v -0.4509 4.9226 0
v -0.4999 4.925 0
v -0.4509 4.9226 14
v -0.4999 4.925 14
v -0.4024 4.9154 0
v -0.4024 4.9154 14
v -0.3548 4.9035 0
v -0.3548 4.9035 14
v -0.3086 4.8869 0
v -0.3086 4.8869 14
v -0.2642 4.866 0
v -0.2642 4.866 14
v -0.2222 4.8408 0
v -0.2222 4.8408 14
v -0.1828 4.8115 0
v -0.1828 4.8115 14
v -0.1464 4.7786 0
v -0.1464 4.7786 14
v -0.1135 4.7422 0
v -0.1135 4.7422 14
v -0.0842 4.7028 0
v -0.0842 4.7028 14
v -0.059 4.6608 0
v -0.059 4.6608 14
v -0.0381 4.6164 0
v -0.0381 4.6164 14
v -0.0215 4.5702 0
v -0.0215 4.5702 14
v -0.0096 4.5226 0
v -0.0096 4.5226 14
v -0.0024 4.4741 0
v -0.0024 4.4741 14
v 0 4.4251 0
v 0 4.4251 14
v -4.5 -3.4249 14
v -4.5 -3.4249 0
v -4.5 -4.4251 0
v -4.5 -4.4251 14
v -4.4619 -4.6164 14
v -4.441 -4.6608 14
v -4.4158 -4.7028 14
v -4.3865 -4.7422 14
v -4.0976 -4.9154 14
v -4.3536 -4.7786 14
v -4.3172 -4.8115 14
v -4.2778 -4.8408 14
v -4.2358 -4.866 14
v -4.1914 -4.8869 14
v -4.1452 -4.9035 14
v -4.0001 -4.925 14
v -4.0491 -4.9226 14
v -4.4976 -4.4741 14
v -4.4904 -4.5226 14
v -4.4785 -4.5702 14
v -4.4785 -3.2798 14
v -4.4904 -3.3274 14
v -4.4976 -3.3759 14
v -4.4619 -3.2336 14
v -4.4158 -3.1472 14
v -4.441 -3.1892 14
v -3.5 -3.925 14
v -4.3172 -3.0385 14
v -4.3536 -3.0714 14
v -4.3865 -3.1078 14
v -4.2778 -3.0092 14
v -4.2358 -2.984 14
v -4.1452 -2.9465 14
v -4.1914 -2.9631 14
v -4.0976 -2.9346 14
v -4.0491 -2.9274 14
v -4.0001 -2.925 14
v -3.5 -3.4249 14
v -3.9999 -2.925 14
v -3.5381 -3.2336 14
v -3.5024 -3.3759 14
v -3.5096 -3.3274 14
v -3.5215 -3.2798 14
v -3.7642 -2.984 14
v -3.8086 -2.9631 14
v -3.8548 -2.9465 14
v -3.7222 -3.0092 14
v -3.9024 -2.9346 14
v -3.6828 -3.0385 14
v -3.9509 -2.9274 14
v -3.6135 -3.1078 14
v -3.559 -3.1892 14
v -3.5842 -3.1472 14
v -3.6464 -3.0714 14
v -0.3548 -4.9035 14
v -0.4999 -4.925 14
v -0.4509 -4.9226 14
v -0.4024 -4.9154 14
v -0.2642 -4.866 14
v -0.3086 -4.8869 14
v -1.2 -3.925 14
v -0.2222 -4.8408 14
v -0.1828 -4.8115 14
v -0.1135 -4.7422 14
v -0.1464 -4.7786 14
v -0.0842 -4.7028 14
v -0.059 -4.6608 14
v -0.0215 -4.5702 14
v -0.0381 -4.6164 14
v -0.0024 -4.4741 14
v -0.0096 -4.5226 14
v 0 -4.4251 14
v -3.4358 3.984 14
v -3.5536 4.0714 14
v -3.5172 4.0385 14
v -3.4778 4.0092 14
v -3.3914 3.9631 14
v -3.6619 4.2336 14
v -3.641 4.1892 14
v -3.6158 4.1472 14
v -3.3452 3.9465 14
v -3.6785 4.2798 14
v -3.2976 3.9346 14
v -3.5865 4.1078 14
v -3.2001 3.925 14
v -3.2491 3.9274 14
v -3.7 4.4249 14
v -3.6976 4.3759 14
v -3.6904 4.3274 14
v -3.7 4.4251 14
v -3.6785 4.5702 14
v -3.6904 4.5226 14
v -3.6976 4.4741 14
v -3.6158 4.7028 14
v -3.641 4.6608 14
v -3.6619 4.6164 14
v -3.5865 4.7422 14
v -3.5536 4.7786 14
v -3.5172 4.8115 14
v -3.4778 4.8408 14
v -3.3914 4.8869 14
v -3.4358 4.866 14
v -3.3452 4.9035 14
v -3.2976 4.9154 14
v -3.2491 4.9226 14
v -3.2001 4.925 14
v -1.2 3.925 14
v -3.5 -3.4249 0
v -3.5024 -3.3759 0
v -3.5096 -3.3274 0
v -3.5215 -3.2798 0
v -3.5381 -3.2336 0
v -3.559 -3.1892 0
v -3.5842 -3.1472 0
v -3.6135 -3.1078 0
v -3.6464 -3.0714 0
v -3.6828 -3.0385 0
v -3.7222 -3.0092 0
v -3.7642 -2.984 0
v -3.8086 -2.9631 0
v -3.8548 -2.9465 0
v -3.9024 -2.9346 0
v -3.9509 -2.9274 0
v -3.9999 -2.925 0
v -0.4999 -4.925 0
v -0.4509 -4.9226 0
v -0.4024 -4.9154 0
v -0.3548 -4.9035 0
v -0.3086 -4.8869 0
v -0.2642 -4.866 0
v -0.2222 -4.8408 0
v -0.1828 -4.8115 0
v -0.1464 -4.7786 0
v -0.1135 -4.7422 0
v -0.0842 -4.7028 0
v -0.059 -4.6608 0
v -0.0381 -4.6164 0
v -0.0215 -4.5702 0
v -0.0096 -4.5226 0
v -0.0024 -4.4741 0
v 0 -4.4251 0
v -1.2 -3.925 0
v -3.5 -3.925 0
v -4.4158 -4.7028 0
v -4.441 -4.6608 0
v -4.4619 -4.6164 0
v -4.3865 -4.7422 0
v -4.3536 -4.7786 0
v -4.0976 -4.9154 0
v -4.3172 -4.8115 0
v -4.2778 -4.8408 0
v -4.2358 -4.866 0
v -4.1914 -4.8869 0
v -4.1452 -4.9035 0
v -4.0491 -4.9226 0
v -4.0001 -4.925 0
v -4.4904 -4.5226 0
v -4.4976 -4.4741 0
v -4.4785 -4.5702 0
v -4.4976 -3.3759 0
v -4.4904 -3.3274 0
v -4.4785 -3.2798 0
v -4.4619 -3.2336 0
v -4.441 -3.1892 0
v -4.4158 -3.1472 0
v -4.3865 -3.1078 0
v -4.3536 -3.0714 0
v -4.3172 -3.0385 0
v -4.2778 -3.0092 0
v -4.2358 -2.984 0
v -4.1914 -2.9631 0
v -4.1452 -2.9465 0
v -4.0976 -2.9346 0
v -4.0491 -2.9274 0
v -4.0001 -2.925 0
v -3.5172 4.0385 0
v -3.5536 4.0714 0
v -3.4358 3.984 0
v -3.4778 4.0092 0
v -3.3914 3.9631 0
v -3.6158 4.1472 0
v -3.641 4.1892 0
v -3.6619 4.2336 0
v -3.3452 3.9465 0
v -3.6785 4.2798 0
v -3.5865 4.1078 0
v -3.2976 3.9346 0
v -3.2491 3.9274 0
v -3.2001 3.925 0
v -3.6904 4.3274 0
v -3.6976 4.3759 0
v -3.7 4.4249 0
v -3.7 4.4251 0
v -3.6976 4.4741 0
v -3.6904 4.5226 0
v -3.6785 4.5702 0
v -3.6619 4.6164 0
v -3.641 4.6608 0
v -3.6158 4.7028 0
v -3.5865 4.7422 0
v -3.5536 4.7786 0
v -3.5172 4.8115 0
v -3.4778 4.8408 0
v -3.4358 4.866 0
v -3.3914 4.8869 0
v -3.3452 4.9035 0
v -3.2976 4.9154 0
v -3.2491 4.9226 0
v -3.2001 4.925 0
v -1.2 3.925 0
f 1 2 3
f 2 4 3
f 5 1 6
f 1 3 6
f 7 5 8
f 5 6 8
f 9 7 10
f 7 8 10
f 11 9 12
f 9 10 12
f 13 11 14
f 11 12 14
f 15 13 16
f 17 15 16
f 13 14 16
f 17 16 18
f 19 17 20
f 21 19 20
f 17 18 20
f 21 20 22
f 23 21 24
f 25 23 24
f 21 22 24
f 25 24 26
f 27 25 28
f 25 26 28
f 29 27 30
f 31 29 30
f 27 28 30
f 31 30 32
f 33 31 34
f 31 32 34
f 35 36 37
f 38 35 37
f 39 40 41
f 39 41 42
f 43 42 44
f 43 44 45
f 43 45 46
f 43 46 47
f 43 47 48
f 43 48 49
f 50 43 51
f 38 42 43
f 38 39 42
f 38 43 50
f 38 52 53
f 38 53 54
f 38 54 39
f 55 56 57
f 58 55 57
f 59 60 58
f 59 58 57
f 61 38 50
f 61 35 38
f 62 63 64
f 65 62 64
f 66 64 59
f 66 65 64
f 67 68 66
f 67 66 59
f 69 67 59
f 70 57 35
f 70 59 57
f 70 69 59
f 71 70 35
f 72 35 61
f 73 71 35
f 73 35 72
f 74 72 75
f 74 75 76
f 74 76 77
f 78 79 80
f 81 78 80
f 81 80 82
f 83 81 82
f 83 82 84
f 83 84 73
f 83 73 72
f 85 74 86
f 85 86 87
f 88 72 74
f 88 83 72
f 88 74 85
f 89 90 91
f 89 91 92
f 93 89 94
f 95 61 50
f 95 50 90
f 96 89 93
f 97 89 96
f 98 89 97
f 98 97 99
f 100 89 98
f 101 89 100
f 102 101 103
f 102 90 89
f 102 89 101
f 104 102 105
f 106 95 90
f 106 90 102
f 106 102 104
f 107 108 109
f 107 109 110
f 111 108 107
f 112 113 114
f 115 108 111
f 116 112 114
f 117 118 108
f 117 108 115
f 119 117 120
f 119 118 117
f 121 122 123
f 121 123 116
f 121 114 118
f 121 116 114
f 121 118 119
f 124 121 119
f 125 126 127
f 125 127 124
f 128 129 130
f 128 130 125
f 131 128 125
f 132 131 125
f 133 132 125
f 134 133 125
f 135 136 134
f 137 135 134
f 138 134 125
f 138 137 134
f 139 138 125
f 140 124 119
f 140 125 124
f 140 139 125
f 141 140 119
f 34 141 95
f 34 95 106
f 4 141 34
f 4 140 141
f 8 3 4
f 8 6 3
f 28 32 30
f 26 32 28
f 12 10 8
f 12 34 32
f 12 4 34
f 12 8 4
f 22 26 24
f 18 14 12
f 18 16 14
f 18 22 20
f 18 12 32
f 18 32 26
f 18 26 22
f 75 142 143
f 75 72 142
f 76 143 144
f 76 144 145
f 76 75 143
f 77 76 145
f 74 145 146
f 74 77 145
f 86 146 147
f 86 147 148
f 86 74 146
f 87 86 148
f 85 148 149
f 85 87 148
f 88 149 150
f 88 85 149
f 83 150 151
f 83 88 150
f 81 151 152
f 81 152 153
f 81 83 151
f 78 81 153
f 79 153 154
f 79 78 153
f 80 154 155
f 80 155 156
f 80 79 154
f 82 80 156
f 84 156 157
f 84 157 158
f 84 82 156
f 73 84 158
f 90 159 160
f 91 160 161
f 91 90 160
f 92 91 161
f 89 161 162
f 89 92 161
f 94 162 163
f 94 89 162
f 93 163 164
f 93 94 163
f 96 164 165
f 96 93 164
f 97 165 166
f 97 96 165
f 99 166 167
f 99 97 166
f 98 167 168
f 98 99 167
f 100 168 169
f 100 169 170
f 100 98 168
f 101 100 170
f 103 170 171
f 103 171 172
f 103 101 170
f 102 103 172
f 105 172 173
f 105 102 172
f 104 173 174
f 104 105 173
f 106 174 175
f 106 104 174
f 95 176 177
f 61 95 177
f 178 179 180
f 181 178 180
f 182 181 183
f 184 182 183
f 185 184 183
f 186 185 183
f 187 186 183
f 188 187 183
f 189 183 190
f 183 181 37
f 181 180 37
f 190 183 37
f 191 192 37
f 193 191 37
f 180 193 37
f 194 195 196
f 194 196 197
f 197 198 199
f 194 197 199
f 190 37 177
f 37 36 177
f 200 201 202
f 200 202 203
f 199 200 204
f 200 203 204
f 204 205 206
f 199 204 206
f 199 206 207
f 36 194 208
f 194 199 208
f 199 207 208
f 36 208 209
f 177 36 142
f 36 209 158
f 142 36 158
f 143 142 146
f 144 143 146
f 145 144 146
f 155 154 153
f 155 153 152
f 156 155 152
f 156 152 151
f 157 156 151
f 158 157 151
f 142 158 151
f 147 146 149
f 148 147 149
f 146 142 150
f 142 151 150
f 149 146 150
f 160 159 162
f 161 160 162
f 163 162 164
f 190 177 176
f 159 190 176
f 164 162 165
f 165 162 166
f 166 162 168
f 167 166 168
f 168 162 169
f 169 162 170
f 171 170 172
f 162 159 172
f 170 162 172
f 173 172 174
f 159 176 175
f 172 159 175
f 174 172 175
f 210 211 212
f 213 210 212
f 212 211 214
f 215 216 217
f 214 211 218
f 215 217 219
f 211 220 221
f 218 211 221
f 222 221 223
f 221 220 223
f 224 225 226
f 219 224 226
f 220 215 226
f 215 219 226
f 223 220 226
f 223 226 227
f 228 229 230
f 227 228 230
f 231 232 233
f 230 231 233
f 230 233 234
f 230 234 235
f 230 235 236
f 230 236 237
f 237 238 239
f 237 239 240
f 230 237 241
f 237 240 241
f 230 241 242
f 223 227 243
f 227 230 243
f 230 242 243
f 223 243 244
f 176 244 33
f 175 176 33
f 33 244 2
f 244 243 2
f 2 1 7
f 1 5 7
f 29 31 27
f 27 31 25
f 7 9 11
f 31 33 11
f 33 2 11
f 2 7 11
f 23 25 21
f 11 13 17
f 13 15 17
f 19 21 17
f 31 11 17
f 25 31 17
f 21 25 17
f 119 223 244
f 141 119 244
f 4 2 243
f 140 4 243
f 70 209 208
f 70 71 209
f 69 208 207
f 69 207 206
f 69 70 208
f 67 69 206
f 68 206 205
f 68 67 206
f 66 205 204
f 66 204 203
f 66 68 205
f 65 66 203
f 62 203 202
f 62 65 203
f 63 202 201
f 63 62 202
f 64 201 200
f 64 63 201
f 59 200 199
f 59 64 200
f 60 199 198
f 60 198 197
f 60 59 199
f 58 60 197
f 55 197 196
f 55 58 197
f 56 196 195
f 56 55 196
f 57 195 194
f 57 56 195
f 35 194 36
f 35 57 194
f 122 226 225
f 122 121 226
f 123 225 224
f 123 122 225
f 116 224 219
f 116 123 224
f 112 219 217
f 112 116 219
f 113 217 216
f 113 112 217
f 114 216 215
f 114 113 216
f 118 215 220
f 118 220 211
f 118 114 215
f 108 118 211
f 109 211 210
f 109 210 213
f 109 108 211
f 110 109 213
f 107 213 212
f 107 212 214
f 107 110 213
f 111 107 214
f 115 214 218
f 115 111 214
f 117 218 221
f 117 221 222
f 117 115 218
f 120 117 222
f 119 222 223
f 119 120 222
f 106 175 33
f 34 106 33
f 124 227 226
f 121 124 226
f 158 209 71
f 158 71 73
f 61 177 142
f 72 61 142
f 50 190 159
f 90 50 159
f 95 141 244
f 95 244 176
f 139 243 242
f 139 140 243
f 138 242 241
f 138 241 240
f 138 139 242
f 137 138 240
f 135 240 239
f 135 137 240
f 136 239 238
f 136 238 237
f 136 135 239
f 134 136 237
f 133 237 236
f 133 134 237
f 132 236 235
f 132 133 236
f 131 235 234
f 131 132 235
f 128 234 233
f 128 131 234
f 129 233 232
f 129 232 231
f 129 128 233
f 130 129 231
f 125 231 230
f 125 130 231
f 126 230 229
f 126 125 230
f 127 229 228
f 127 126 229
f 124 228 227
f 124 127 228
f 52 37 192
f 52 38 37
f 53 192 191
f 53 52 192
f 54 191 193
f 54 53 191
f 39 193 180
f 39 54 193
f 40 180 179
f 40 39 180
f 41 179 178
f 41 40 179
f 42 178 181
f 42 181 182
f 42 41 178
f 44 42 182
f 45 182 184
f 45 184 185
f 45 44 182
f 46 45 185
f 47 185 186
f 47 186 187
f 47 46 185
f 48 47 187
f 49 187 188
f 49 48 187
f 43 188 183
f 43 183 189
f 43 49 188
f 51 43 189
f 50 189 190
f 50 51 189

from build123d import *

# Parameters (mm, degrees)
SKETCH1_W           = 1
SKETCH1_H           = 1
BOSS_EXTRUDE1_DEPTH = 14
FILLET1_R           = 0.5


with BuildPart() as part:
    # Sketch1 → Boss-Extrude1 (new body)
    with BuildSketch(Plane.XY):
        Polygon((0, 4.925), (-3.7, 4.925), (-3.7, 3.925), (-1.2, 3.925), (-1.2, 0), (0, 0), align=None)
        Polygon((0, -4.925), (0, 0), (-1.2, 0), (-1.2, -3.925), (-3.5, -3.925), (-4.5, -3.925), (-4.5, -4.925), align=None)
        with Locations((-4, -3.425)):
            Rectangle(SKETCH1_W, SKETCH1_H)
    extrude(amount=BOSS_EXTRUDE1_DEPTH)

    # Fillet1
    fillet1_edges = [part.edges().sort_by_distance(p)[0] for p in [
        (0, -4.925, 7),
        (-4.5, -4.925, 7),
        (-4.5, -2.925, 7),
        (-3.5, -2.925, 7),
        (-3.7, 3.925, 7),
        (-3.7, 4.925, 7),
        (0, 4.925, 7),
    ]]
    fillet(fillet1_edges, radius=FILLET1_R - 0.0001)  # a hair under: the kernel refuses the full size


solid = part.part
